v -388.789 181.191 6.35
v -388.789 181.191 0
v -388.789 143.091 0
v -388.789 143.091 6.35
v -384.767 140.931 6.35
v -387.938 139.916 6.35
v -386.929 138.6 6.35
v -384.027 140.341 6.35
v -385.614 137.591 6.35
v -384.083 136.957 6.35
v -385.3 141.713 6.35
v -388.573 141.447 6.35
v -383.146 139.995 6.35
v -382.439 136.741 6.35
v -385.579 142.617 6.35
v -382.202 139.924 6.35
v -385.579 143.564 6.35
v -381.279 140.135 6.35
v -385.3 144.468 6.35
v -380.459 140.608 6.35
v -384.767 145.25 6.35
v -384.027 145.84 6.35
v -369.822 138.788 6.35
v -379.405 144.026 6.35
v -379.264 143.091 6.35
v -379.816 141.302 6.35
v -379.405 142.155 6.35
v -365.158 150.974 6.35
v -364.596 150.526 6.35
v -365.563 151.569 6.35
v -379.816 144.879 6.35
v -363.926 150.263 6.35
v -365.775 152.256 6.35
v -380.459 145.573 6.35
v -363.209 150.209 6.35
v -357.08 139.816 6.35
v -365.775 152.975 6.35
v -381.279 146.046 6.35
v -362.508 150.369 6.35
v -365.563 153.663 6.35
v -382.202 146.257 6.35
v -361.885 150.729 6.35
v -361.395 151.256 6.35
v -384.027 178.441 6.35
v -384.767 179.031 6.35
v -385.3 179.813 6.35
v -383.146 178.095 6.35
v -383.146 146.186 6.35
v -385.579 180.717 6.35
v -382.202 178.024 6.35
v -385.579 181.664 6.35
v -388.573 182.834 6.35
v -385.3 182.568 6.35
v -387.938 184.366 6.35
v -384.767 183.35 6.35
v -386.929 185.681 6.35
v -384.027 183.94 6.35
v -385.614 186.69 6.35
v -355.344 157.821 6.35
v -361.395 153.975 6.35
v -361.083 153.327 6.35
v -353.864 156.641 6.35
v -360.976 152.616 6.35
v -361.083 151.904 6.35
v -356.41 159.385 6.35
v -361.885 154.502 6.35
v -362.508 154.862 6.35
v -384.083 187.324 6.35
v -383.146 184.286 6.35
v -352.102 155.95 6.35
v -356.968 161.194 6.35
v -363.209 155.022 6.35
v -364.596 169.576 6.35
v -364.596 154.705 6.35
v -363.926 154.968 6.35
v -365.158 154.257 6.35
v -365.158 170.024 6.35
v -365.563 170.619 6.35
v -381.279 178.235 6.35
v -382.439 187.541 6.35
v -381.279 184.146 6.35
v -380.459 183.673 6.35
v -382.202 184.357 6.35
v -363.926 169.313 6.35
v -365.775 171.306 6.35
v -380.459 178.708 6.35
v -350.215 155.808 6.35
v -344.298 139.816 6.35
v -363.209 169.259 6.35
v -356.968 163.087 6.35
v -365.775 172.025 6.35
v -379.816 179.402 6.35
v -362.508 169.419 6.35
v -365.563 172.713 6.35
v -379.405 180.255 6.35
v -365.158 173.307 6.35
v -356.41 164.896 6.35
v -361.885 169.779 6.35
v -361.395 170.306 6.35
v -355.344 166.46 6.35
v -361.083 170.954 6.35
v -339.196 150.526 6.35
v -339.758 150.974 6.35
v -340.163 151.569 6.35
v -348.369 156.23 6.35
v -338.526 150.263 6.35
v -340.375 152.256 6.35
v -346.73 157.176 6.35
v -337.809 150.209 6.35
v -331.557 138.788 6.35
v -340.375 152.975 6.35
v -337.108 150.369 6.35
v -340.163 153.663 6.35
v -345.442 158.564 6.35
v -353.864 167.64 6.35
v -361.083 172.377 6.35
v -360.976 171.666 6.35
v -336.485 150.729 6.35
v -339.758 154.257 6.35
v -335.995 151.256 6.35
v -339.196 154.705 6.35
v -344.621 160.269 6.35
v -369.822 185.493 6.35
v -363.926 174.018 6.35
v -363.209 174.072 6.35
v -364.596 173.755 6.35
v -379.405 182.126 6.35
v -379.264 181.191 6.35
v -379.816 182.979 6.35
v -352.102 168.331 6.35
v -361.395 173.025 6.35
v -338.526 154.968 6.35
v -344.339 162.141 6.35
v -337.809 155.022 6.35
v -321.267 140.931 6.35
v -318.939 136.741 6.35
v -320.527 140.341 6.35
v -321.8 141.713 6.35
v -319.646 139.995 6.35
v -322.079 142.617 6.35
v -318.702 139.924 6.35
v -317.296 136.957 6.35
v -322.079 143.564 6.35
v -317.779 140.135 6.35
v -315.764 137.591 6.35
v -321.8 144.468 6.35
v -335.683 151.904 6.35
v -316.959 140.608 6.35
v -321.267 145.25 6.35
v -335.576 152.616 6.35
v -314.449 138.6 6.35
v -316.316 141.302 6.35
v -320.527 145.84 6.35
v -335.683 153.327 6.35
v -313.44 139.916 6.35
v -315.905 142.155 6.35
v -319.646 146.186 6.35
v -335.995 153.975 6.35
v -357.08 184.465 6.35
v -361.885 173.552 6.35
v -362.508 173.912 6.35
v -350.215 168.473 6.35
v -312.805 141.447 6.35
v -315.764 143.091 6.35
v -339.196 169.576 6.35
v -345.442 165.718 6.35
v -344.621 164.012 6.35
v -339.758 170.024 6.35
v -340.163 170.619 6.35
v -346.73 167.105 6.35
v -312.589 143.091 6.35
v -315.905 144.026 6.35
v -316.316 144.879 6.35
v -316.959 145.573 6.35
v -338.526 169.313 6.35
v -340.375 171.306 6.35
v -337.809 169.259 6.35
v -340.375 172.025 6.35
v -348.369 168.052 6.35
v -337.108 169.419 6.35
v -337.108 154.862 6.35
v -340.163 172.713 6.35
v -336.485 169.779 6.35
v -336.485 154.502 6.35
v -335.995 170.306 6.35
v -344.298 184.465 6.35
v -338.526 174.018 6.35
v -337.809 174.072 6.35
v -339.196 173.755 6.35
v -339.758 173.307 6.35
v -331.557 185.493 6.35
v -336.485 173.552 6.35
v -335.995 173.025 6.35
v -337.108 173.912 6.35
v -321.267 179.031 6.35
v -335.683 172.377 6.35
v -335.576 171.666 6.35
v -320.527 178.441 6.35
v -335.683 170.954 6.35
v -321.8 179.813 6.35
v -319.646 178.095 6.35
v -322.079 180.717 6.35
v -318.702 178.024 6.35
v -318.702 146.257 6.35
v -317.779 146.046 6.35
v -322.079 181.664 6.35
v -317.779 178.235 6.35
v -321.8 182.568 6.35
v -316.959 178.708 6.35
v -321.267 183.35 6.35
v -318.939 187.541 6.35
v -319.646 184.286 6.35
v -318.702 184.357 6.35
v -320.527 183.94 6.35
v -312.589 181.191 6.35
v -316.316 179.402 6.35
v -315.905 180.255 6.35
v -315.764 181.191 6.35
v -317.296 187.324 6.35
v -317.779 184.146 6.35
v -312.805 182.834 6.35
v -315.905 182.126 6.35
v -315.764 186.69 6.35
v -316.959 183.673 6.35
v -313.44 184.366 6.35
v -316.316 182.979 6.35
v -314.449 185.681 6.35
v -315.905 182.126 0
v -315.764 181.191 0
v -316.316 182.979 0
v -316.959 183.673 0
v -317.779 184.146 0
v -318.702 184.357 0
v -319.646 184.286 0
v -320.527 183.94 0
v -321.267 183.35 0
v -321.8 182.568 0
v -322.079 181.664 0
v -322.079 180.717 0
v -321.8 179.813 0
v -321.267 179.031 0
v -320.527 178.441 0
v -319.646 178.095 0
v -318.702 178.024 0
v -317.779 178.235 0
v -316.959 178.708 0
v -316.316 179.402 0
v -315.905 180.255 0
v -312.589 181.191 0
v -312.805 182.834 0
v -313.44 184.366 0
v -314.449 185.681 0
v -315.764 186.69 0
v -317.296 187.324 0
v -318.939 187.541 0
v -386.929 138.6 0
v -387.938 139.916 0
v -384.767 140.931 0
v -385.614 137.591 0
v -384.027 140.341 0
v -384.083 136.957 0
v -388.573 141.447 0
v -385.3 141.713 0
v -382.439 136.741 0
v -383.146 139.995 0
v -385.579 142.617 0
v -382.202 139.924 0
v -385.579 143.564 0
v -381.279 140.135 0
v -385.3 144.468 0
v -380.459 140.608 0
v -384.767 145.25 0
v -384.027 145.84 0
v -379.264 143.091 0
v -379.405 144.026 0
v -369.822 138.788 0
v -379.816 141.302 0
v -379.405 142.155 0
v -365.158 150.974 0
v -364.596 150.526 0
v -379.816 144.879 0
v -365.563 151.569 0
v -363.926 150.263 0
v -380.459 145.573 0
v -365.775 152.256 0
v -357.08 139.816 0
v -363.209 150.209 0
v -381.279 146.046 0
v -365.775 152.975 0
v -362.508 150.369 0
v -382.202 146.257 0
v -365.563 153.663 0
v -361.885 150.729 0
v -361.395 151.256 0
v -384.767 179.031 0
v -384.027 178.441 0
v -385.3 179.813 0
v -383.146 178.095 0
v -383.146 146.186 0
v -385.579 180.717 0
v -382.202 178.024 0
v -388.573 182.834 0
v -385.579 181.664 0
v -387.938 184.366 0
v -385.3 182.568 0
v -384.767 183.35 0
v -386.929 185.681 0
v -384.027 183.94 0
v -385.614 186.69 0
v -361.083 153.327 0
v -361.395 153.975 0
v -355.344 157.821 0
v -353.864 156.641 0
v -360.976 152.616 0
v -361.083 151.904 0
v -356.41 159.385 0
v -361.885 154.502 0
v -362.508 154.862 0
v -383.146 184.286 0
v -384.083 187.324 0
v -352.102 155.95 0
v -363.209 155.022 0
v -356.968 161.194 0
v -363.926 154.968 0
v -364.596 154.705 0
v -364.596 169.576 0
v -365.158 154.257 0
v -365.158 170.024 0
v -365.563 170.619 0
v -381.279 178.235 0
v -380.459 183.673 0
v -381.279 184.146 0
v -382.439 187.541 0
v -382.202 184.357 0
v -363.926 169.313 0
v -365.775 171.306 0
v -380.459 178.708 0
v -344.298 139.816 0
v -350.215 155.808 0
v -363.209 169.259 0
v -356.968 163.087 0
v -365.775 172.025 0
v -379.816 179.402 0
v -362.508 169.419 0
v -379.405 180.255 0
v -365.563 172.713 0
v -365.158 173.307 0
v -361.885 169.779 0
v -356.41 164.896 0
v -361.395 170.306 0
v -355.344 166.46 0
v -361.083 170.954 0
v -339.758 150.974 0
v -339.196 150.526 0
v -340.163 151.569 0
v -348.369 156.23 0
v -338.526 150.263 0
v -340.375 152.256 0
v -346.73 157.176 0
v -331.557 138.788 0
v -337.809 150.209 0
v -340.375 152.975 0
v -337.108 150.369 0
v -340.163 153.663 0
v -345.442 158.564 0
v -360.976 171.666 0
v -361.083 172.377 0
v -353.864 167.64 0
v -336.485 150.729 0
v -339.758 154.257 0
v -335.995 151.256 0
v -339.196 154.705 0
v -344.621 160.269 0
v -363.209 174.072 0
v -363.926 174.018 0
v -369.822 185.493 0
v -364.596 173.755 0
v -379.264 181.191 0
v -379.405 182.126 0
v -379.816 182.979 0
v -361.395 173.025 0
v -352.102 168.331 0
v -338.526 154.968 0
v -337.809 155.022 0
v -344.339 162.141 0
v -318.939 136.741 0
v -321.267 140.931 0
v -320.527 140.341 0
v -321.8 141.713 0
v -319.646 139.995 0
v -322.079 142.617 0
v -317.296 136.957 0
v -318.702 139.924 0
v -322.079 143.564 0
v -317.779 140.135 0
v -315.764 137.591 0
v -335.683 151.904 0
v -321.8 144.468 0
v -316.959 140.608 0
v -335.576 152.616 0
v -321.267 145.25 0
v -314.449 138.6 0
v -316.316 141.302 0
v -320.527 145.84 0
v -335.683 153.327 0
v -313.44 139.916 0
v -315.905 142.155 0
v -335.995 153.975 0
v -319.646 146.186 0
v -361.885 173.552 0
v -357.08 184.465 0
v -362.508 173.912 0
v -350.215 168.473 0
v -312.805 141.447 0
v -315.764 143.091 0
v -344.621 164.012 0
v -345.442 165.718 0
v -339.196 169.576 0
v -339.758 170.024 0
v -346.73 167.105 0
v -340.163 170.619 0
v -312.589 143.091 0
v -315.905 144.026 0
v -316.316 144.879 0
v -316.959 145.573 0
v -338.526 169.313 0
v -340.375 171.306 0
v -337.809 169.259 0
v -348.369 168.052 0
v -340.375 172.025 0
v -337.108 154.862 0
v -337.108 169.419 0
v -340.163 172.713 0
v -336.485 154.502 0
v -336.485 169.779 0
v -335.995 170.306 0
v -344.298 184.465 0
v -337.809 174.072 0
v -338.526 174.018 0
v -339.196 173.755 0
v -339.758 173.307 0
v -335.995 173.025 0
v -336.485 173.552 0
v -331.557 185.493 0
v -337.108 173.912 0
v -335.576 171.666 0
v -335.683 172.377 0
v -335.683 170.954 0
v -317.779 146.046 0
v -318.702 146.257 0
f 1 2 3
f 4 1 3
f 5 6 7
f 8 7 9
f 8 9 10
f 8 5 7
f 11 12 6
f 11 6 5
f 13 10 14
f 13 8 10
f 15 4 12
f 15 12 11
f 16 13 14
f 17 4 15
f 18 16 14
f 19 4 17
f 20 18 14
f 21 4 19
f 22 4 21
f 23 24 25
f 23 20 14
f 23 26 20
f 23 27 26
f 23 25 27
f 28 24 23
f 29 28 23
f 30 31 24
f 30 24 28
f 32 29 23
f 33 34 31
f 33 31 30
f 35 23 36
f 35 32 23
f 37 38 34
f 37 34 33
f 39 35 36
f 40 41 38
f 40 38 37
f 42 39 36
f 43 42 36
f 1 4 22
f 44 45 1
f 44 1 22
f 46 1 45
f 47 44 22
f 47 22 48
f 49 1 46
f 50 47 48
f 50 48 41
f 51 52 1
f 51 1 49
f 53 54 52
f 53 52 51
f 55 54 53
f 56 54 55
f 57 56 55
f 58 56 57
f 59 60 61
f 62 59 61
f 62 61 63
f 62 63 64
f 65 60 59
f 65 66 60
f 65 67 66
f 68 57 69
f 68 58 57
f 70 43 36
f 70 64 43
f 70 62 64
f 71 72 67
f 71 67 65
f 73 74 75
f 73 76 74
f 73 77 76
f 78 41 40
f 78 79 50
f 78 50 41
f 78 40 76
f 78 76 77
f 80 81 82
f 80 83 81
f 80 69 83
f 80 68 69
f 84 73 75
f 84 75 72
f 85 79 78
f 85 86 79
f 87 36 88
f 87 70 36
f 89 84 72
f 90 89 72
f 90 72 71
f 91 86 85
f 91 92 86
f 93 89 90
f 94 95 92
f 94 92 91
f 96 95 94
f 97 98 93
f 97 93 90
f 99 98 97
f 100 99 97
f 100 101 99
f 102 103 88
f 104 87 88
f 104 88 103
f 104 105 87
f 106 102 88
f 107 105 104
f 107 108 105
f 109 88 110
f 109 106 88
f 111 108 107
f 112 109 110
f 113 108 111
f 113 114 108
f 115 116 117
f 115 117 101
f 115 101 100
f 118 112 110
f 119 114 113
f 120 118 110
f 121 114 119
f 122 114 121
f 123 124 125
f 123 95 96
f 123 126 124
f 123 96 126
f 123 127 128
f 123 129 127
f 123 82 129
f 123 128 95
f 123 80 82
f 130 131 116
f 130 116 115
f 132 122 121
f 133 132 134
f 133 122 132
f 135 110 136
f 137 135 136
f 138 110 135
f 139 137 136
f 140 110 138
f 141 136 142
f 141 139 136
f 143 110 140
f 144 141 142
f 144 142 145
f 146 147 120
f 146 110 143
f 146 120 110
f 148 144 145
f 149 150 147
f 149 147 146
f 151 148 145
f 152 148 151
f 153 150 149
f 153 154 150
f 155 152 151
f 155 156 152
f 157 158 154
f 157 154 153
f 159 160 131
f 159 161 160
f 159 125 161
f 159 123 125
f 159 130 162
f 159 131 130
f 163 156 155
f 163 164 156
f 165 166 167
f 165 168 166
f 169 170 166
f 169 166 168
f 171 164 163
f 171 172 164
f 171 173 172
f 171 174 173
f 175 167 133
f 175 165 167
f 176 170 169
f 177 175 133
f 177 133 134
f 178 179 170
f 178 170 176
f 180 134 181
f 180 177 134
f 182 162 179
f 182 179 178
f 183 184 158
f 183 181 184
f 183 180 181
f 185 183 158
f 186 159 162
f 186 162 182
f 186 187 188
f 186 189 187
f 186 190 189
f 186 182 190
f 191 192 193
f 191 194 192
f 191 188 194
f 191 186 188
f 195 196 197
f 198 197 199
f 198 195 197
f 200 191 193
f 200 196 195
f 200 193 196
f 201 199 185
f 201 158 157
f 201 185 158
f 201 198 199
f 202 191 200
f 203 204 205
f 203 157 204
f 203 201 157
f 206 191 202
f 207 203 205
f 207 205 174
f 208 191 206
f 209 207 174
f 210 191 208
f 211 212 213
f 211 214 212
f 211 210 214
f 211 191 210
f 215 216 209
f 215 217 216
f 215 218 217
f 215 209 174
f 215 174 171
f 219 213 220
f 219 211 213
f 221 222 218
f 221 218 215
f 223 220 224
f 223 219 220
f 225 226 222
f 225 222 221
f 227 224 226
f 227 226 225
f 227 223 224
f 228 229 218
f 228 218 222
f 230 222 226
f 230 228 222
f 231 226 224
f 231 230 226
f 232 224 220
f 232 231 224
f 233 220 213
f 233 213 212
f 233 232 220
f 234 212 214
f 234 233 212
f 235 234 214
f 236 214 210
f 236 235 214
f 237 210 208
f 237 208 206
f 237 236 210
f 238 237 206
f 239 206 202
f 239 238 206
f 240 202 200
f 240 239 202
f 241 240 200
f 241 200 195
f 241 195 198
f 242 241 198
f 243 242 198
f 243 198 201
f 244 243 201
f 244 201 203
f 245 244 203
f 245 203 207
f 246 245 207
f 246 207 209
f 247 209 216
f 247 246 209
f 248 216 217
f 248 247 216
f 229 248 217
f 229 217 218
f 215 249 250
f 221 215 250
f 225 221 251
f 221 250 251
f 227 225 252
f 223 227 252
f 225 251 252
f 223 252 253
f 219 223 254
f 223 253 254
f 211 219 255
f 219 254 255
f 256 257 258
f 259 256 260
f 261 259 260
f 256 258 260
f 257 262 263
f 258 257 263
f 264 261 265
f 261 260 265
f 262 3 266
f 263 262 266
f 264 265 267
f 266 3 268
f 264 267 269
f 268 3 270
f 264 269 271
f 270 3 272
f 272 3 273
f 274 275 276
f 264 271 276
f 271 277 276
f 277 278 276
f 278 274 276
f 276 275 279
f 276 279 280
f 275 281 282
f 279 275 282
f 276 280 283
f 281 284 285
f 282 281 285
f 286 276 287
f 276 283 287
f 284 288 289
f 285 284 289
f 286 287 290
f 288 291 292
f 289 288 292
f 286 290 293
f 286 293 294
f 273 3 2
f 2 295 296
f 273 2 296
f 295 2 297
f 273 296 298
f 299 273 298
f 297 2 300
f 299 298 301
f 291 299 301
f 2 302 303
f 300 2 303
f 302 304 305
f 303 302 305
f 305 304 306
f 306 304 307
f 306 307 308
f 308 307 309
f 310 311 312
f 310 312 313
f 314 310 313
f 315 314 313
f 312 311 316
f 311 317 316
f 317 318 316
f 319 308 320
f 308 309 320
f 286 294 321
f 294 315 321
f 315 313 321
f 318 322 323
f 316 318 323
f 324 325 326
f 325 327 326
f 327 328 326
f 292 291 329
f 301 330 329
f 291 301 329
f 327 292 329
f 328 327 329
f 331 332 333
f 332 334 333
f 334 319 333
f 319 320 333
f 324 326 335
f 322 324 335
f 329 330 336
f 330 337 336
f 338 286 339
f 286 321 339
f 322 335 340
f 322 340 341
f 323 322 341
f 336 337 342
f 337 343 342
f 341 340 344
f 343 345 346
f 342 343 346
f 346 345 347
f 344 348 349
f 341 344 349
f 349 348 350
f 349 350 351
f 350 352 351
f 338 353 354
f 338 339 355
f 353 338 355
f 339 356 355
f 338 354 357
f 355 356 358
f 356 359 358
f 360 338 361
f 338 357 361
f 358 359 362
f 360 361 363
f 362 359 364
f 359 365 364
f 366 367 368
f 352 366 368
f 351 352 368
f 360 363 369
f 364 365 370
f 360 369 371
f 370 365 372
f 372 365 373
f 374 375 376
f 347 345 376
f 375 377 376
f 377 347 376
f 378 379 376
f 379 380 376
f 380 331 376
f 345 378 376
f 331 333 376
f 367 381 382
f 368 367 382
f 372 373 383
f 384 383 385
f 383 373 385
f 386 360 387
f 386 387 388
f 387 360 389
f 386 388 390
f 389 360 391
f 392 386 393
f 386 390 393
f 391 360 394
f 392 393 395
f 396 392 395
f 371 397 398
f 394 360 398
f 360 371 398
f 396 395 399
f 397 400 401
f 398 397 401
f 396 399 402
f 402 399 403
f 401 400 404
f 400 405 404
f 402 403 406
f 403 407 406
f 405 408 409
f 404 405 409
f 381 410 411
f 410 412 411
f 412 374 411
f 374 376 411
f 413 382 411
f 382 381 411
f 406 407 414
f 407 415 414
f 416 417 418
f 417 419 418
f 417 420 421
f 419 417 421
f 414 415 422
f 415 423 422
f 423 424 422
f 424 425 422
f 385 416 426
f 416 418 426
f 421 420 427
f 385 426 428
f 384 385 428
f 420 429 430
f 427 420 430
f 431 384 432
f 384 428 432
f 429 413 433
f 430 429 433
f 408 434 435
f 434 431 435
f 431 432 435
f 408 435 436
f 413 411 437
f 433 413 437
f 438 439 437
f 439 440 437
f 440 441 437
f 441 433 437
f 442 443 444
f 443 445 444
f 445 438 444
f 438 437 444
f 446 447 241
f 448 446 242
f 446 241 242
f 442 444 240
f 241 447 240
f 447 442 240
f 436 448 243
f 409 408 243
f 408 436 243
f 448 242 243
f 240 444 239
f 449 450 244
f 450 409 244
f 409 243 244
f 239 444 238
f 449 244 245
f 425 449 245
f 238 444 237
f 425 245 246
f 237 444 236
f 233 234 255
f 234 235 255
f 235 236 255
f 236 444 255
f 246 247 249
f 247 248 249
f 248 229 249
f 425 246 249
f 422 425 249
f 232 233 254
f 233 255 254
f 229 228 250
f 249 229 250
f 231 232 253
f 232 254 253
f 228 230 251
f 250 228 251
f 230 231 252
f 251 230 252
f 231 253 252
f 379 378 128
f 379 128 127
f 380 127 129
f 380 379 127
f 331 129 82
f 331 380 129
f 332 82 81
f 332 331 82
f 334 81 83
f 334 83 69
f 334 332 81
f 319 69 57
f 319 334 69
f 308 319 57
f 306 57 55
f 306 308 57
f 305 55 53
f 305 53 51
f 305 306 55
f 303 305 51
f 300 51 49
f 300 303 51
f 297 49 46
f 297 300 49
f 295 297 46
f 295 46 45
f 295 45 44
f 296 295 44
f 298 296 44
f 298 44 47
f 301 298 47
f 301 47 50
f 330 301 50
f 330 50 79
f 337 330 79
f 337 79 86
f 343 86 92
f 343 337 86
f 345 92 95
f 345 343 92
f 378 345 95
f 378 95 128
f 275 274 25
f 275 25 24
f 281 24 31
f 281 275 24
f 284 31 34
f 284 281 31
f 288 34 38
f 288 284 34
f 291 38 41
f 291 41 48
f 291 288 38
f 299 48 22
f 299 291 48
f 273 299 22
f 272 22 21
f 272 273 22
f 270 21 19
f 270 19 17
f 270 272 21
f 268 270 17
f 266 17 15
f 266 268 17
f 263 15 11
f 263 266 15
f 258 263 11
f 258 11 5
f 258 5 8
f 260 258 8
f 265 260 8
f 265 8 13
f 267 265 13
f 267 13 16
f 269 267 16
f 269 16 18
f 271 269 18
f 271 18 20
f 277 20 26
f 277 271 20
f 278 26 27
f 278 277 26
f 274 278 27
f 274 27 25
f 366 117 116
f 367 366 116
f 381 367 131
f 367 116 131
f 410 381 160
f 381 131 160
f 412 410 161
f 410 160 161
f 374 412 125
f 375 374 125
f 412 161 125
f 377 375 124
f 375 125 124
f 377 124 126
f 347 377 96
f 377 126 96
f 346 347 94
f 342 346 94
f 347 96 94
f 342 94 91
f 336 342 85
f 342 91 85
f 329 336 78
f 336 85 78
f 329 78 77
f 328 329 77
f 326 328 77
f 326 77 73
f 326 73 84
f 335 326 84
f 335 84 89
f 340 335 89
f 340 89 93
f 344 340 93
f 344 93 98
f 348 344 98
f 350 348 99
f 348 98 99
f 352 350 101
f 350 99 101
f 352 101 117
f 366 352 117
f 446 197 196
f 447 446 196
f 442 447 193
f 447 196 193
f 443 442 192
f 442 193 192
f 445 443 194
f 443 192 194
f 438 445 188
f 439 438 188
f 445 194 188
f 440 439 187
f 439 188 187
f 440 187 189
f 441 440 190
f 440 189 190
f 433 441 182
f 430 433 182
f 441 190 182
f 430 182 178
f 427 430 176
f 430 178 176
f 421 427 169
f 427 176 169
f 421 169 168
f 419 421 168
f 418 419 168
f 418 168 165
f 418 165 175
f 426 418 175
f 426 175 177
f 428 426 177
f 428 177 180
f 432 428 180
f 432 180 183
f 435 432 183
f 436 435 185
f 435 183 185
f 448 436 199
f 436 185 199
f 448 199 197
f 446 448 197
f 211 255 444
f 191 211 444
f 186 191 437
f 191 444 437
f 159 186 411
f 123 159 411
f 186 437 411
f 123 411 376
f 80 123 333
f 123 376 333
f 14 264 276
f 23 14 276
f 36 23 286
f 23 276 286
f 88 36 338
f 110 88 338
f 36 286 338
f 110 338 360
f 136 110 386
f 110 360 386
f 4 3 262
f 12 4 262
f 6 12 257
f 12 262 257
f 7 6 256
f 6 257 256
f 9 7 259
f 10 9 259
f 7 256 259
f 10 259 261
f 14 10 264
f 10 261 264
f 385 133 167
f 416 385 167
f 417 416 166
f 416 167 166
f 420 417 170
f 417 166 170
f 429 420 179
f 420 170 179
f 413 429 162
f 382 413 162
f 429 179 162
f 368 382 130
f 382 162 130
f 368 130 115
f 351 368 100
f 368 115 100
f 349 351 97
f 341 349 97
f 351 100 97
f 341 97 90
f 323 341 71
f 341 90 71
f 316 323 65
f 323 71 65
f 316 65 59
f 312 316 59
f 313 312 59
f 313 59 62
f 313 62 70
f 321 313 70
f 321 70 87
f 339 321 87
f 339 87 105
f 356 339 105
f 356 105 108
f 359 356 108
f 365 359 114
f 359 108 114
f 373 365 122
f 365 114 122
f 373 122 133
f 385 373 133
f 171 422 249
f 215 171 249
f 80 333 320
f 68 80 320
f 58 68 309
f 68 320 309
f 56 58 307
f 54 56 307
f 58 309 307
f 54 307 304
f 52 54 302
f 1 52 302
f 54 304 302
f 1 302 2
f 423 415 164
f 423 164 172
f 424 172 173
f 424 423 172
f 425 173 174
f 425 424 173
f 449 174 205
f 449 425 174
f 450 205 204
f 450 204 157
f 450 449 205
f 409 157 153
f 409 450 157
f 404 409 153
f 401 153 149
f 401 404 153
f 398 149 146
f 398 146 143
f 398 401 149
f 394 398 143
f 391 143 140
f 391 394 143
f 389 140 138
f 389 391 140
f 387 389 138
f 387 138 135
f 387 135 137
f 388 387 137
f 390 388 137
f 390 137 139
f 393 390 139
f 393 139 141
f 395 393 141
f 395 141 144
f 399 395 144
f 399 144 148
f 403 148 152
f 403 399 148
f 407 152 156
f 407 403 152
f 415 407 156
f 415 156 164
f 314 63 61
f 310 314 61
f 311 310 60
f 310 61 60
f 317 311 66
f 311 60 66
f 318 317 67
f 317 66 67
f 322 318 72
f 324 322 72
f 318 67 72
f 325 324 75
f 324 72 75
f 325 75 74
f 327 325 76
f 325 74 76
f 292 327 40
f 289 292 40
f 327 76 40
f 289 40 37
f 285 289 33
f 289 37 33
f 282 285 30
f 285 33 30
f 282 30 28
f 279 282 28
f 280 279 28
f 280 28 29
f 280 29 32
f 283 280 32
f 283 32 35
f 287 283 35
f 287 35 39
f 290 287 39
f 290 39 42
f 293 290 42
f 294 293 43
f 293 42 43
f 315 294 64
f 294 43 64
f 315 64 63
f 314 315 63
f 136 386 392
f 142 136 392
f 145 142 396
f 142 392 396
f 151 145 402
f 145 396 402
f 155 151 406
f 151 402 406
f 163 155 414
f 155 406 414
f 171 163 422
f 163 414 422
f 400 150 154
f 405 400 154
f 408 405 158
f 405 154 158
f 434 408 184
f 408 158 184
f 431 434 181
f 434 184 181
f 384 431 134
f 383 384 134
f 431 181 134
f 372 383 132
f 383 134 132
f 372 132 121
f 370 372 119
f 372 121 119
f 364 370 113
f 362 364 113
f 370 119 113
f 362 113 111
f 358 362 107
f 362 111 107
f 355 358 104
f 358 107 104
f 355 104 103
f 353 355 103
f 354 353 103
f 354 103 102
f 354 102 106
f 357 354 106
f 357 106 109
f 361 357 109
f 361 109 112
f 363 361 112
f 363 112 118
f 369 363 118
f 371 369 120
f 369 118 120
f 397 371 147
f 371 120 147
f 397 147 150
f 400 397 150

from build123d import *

# Parameters (mm, degrees)
SKETCH1_R           = 3.175
BOSS_EXTRUDE1_DEPTH = 6.35
SKETCH3_R           = 6.35
CUT_EXTRUDE1_DEPTH  = 6.35
SKETCH4_R           = 2.413
CUT_EXTRUDE2_DEPTH  = 6.35


with BuildPart() as part:
    # Sketch1 → Boss-Extrude1 (new body)
    with BuildSketch(Plane.XY):
        with BuildLine():
            Line((-388.789077681, 181.190585859), (-388.789077681, 143.090585859))
            ThreePointArc((-388.789077681, 143.090585859), (-386.929205741, 138.600457798), (-382.439077681, 136.740585859))
            ThreePointArc((-382.439077681, 136.740585859), (-350.689077681, 139.944338866), (-318.939077681, 136.740585859))
            ThreePointArc((-318.939077681, 136.740585859), (-314.44894962, 138.600457798), (-312.589077681, 143.090585859))
            Line((-312.589077681, 143.090585859), (-312.589077681, 181.190585859))
            ThreePointArc((-312.589077681, 181.190585859), (-314.44894962, 185.680713919), (-318.939077681, 187.540585859))
            ThreePointArc((-318.939077681, 187.540585859), (-350.689077681, 184.336832851), (-382.439077681, 187.540585859))
            ThreePointArc((-382.439077681, 187.540585859), (-386.929205741, 185.680713919), (-388.789077681, 181.190585859))
        make_face()
        with Locations((-382.439077681, 181.190585859)):
            Circle(SKETCH1_R, mode=Mode.SUBTRACT)
        with Locations((-318.939077681, 181.190585859)):
            Circle(SKETCH1_R, mode=Mode.SUBTRACT)
        with Locations((-382.439077681, 143.090585859)):
            Circle(SKETCH1_R, mode=Mode.SUBTRACT)
        with Locations((-318.939077681, 143.090585859)):
            Circle(SKETCH1_R, mode=Mode.SUBTRACT)
    extrude(amount=BOSS_EXTRUDE1_DEPTH)

    # Sketch3 → Cut-Extrude1 (cut)
    with BuildSketch(Plane.XY.offset(6.35)):
        with Locations((-350.689077681, 162.140585859)):
            Circle(SKETCH3_R)
    extrude(amount=-CUT_EXTRUDE1_DEPTH, mode=Mode.SUBTRACT)

    # Sketch4 → Cut-Extrude2 (cut)
    with BuildSketch(Plane.XY.offset(6.35)):
        with Locations((-337.989077681, 171.665585859)):
            Circle(SKETCH4_R)
        with Locations((-337.989077681, 152.615585859)):
            Circle(SKETCH4_R)
        with Locations((-363.389077681, 152.615585859)):
            Circle(SKETCH4_R)
        with Locations((-363.389077681, 171.665585859)):
            Circle(SKETCH4_R)
    extrude(amount=-CUT_EXTRUDE2_DEPTH, mode=Mode.SUBTRACT)


solid = part.part
